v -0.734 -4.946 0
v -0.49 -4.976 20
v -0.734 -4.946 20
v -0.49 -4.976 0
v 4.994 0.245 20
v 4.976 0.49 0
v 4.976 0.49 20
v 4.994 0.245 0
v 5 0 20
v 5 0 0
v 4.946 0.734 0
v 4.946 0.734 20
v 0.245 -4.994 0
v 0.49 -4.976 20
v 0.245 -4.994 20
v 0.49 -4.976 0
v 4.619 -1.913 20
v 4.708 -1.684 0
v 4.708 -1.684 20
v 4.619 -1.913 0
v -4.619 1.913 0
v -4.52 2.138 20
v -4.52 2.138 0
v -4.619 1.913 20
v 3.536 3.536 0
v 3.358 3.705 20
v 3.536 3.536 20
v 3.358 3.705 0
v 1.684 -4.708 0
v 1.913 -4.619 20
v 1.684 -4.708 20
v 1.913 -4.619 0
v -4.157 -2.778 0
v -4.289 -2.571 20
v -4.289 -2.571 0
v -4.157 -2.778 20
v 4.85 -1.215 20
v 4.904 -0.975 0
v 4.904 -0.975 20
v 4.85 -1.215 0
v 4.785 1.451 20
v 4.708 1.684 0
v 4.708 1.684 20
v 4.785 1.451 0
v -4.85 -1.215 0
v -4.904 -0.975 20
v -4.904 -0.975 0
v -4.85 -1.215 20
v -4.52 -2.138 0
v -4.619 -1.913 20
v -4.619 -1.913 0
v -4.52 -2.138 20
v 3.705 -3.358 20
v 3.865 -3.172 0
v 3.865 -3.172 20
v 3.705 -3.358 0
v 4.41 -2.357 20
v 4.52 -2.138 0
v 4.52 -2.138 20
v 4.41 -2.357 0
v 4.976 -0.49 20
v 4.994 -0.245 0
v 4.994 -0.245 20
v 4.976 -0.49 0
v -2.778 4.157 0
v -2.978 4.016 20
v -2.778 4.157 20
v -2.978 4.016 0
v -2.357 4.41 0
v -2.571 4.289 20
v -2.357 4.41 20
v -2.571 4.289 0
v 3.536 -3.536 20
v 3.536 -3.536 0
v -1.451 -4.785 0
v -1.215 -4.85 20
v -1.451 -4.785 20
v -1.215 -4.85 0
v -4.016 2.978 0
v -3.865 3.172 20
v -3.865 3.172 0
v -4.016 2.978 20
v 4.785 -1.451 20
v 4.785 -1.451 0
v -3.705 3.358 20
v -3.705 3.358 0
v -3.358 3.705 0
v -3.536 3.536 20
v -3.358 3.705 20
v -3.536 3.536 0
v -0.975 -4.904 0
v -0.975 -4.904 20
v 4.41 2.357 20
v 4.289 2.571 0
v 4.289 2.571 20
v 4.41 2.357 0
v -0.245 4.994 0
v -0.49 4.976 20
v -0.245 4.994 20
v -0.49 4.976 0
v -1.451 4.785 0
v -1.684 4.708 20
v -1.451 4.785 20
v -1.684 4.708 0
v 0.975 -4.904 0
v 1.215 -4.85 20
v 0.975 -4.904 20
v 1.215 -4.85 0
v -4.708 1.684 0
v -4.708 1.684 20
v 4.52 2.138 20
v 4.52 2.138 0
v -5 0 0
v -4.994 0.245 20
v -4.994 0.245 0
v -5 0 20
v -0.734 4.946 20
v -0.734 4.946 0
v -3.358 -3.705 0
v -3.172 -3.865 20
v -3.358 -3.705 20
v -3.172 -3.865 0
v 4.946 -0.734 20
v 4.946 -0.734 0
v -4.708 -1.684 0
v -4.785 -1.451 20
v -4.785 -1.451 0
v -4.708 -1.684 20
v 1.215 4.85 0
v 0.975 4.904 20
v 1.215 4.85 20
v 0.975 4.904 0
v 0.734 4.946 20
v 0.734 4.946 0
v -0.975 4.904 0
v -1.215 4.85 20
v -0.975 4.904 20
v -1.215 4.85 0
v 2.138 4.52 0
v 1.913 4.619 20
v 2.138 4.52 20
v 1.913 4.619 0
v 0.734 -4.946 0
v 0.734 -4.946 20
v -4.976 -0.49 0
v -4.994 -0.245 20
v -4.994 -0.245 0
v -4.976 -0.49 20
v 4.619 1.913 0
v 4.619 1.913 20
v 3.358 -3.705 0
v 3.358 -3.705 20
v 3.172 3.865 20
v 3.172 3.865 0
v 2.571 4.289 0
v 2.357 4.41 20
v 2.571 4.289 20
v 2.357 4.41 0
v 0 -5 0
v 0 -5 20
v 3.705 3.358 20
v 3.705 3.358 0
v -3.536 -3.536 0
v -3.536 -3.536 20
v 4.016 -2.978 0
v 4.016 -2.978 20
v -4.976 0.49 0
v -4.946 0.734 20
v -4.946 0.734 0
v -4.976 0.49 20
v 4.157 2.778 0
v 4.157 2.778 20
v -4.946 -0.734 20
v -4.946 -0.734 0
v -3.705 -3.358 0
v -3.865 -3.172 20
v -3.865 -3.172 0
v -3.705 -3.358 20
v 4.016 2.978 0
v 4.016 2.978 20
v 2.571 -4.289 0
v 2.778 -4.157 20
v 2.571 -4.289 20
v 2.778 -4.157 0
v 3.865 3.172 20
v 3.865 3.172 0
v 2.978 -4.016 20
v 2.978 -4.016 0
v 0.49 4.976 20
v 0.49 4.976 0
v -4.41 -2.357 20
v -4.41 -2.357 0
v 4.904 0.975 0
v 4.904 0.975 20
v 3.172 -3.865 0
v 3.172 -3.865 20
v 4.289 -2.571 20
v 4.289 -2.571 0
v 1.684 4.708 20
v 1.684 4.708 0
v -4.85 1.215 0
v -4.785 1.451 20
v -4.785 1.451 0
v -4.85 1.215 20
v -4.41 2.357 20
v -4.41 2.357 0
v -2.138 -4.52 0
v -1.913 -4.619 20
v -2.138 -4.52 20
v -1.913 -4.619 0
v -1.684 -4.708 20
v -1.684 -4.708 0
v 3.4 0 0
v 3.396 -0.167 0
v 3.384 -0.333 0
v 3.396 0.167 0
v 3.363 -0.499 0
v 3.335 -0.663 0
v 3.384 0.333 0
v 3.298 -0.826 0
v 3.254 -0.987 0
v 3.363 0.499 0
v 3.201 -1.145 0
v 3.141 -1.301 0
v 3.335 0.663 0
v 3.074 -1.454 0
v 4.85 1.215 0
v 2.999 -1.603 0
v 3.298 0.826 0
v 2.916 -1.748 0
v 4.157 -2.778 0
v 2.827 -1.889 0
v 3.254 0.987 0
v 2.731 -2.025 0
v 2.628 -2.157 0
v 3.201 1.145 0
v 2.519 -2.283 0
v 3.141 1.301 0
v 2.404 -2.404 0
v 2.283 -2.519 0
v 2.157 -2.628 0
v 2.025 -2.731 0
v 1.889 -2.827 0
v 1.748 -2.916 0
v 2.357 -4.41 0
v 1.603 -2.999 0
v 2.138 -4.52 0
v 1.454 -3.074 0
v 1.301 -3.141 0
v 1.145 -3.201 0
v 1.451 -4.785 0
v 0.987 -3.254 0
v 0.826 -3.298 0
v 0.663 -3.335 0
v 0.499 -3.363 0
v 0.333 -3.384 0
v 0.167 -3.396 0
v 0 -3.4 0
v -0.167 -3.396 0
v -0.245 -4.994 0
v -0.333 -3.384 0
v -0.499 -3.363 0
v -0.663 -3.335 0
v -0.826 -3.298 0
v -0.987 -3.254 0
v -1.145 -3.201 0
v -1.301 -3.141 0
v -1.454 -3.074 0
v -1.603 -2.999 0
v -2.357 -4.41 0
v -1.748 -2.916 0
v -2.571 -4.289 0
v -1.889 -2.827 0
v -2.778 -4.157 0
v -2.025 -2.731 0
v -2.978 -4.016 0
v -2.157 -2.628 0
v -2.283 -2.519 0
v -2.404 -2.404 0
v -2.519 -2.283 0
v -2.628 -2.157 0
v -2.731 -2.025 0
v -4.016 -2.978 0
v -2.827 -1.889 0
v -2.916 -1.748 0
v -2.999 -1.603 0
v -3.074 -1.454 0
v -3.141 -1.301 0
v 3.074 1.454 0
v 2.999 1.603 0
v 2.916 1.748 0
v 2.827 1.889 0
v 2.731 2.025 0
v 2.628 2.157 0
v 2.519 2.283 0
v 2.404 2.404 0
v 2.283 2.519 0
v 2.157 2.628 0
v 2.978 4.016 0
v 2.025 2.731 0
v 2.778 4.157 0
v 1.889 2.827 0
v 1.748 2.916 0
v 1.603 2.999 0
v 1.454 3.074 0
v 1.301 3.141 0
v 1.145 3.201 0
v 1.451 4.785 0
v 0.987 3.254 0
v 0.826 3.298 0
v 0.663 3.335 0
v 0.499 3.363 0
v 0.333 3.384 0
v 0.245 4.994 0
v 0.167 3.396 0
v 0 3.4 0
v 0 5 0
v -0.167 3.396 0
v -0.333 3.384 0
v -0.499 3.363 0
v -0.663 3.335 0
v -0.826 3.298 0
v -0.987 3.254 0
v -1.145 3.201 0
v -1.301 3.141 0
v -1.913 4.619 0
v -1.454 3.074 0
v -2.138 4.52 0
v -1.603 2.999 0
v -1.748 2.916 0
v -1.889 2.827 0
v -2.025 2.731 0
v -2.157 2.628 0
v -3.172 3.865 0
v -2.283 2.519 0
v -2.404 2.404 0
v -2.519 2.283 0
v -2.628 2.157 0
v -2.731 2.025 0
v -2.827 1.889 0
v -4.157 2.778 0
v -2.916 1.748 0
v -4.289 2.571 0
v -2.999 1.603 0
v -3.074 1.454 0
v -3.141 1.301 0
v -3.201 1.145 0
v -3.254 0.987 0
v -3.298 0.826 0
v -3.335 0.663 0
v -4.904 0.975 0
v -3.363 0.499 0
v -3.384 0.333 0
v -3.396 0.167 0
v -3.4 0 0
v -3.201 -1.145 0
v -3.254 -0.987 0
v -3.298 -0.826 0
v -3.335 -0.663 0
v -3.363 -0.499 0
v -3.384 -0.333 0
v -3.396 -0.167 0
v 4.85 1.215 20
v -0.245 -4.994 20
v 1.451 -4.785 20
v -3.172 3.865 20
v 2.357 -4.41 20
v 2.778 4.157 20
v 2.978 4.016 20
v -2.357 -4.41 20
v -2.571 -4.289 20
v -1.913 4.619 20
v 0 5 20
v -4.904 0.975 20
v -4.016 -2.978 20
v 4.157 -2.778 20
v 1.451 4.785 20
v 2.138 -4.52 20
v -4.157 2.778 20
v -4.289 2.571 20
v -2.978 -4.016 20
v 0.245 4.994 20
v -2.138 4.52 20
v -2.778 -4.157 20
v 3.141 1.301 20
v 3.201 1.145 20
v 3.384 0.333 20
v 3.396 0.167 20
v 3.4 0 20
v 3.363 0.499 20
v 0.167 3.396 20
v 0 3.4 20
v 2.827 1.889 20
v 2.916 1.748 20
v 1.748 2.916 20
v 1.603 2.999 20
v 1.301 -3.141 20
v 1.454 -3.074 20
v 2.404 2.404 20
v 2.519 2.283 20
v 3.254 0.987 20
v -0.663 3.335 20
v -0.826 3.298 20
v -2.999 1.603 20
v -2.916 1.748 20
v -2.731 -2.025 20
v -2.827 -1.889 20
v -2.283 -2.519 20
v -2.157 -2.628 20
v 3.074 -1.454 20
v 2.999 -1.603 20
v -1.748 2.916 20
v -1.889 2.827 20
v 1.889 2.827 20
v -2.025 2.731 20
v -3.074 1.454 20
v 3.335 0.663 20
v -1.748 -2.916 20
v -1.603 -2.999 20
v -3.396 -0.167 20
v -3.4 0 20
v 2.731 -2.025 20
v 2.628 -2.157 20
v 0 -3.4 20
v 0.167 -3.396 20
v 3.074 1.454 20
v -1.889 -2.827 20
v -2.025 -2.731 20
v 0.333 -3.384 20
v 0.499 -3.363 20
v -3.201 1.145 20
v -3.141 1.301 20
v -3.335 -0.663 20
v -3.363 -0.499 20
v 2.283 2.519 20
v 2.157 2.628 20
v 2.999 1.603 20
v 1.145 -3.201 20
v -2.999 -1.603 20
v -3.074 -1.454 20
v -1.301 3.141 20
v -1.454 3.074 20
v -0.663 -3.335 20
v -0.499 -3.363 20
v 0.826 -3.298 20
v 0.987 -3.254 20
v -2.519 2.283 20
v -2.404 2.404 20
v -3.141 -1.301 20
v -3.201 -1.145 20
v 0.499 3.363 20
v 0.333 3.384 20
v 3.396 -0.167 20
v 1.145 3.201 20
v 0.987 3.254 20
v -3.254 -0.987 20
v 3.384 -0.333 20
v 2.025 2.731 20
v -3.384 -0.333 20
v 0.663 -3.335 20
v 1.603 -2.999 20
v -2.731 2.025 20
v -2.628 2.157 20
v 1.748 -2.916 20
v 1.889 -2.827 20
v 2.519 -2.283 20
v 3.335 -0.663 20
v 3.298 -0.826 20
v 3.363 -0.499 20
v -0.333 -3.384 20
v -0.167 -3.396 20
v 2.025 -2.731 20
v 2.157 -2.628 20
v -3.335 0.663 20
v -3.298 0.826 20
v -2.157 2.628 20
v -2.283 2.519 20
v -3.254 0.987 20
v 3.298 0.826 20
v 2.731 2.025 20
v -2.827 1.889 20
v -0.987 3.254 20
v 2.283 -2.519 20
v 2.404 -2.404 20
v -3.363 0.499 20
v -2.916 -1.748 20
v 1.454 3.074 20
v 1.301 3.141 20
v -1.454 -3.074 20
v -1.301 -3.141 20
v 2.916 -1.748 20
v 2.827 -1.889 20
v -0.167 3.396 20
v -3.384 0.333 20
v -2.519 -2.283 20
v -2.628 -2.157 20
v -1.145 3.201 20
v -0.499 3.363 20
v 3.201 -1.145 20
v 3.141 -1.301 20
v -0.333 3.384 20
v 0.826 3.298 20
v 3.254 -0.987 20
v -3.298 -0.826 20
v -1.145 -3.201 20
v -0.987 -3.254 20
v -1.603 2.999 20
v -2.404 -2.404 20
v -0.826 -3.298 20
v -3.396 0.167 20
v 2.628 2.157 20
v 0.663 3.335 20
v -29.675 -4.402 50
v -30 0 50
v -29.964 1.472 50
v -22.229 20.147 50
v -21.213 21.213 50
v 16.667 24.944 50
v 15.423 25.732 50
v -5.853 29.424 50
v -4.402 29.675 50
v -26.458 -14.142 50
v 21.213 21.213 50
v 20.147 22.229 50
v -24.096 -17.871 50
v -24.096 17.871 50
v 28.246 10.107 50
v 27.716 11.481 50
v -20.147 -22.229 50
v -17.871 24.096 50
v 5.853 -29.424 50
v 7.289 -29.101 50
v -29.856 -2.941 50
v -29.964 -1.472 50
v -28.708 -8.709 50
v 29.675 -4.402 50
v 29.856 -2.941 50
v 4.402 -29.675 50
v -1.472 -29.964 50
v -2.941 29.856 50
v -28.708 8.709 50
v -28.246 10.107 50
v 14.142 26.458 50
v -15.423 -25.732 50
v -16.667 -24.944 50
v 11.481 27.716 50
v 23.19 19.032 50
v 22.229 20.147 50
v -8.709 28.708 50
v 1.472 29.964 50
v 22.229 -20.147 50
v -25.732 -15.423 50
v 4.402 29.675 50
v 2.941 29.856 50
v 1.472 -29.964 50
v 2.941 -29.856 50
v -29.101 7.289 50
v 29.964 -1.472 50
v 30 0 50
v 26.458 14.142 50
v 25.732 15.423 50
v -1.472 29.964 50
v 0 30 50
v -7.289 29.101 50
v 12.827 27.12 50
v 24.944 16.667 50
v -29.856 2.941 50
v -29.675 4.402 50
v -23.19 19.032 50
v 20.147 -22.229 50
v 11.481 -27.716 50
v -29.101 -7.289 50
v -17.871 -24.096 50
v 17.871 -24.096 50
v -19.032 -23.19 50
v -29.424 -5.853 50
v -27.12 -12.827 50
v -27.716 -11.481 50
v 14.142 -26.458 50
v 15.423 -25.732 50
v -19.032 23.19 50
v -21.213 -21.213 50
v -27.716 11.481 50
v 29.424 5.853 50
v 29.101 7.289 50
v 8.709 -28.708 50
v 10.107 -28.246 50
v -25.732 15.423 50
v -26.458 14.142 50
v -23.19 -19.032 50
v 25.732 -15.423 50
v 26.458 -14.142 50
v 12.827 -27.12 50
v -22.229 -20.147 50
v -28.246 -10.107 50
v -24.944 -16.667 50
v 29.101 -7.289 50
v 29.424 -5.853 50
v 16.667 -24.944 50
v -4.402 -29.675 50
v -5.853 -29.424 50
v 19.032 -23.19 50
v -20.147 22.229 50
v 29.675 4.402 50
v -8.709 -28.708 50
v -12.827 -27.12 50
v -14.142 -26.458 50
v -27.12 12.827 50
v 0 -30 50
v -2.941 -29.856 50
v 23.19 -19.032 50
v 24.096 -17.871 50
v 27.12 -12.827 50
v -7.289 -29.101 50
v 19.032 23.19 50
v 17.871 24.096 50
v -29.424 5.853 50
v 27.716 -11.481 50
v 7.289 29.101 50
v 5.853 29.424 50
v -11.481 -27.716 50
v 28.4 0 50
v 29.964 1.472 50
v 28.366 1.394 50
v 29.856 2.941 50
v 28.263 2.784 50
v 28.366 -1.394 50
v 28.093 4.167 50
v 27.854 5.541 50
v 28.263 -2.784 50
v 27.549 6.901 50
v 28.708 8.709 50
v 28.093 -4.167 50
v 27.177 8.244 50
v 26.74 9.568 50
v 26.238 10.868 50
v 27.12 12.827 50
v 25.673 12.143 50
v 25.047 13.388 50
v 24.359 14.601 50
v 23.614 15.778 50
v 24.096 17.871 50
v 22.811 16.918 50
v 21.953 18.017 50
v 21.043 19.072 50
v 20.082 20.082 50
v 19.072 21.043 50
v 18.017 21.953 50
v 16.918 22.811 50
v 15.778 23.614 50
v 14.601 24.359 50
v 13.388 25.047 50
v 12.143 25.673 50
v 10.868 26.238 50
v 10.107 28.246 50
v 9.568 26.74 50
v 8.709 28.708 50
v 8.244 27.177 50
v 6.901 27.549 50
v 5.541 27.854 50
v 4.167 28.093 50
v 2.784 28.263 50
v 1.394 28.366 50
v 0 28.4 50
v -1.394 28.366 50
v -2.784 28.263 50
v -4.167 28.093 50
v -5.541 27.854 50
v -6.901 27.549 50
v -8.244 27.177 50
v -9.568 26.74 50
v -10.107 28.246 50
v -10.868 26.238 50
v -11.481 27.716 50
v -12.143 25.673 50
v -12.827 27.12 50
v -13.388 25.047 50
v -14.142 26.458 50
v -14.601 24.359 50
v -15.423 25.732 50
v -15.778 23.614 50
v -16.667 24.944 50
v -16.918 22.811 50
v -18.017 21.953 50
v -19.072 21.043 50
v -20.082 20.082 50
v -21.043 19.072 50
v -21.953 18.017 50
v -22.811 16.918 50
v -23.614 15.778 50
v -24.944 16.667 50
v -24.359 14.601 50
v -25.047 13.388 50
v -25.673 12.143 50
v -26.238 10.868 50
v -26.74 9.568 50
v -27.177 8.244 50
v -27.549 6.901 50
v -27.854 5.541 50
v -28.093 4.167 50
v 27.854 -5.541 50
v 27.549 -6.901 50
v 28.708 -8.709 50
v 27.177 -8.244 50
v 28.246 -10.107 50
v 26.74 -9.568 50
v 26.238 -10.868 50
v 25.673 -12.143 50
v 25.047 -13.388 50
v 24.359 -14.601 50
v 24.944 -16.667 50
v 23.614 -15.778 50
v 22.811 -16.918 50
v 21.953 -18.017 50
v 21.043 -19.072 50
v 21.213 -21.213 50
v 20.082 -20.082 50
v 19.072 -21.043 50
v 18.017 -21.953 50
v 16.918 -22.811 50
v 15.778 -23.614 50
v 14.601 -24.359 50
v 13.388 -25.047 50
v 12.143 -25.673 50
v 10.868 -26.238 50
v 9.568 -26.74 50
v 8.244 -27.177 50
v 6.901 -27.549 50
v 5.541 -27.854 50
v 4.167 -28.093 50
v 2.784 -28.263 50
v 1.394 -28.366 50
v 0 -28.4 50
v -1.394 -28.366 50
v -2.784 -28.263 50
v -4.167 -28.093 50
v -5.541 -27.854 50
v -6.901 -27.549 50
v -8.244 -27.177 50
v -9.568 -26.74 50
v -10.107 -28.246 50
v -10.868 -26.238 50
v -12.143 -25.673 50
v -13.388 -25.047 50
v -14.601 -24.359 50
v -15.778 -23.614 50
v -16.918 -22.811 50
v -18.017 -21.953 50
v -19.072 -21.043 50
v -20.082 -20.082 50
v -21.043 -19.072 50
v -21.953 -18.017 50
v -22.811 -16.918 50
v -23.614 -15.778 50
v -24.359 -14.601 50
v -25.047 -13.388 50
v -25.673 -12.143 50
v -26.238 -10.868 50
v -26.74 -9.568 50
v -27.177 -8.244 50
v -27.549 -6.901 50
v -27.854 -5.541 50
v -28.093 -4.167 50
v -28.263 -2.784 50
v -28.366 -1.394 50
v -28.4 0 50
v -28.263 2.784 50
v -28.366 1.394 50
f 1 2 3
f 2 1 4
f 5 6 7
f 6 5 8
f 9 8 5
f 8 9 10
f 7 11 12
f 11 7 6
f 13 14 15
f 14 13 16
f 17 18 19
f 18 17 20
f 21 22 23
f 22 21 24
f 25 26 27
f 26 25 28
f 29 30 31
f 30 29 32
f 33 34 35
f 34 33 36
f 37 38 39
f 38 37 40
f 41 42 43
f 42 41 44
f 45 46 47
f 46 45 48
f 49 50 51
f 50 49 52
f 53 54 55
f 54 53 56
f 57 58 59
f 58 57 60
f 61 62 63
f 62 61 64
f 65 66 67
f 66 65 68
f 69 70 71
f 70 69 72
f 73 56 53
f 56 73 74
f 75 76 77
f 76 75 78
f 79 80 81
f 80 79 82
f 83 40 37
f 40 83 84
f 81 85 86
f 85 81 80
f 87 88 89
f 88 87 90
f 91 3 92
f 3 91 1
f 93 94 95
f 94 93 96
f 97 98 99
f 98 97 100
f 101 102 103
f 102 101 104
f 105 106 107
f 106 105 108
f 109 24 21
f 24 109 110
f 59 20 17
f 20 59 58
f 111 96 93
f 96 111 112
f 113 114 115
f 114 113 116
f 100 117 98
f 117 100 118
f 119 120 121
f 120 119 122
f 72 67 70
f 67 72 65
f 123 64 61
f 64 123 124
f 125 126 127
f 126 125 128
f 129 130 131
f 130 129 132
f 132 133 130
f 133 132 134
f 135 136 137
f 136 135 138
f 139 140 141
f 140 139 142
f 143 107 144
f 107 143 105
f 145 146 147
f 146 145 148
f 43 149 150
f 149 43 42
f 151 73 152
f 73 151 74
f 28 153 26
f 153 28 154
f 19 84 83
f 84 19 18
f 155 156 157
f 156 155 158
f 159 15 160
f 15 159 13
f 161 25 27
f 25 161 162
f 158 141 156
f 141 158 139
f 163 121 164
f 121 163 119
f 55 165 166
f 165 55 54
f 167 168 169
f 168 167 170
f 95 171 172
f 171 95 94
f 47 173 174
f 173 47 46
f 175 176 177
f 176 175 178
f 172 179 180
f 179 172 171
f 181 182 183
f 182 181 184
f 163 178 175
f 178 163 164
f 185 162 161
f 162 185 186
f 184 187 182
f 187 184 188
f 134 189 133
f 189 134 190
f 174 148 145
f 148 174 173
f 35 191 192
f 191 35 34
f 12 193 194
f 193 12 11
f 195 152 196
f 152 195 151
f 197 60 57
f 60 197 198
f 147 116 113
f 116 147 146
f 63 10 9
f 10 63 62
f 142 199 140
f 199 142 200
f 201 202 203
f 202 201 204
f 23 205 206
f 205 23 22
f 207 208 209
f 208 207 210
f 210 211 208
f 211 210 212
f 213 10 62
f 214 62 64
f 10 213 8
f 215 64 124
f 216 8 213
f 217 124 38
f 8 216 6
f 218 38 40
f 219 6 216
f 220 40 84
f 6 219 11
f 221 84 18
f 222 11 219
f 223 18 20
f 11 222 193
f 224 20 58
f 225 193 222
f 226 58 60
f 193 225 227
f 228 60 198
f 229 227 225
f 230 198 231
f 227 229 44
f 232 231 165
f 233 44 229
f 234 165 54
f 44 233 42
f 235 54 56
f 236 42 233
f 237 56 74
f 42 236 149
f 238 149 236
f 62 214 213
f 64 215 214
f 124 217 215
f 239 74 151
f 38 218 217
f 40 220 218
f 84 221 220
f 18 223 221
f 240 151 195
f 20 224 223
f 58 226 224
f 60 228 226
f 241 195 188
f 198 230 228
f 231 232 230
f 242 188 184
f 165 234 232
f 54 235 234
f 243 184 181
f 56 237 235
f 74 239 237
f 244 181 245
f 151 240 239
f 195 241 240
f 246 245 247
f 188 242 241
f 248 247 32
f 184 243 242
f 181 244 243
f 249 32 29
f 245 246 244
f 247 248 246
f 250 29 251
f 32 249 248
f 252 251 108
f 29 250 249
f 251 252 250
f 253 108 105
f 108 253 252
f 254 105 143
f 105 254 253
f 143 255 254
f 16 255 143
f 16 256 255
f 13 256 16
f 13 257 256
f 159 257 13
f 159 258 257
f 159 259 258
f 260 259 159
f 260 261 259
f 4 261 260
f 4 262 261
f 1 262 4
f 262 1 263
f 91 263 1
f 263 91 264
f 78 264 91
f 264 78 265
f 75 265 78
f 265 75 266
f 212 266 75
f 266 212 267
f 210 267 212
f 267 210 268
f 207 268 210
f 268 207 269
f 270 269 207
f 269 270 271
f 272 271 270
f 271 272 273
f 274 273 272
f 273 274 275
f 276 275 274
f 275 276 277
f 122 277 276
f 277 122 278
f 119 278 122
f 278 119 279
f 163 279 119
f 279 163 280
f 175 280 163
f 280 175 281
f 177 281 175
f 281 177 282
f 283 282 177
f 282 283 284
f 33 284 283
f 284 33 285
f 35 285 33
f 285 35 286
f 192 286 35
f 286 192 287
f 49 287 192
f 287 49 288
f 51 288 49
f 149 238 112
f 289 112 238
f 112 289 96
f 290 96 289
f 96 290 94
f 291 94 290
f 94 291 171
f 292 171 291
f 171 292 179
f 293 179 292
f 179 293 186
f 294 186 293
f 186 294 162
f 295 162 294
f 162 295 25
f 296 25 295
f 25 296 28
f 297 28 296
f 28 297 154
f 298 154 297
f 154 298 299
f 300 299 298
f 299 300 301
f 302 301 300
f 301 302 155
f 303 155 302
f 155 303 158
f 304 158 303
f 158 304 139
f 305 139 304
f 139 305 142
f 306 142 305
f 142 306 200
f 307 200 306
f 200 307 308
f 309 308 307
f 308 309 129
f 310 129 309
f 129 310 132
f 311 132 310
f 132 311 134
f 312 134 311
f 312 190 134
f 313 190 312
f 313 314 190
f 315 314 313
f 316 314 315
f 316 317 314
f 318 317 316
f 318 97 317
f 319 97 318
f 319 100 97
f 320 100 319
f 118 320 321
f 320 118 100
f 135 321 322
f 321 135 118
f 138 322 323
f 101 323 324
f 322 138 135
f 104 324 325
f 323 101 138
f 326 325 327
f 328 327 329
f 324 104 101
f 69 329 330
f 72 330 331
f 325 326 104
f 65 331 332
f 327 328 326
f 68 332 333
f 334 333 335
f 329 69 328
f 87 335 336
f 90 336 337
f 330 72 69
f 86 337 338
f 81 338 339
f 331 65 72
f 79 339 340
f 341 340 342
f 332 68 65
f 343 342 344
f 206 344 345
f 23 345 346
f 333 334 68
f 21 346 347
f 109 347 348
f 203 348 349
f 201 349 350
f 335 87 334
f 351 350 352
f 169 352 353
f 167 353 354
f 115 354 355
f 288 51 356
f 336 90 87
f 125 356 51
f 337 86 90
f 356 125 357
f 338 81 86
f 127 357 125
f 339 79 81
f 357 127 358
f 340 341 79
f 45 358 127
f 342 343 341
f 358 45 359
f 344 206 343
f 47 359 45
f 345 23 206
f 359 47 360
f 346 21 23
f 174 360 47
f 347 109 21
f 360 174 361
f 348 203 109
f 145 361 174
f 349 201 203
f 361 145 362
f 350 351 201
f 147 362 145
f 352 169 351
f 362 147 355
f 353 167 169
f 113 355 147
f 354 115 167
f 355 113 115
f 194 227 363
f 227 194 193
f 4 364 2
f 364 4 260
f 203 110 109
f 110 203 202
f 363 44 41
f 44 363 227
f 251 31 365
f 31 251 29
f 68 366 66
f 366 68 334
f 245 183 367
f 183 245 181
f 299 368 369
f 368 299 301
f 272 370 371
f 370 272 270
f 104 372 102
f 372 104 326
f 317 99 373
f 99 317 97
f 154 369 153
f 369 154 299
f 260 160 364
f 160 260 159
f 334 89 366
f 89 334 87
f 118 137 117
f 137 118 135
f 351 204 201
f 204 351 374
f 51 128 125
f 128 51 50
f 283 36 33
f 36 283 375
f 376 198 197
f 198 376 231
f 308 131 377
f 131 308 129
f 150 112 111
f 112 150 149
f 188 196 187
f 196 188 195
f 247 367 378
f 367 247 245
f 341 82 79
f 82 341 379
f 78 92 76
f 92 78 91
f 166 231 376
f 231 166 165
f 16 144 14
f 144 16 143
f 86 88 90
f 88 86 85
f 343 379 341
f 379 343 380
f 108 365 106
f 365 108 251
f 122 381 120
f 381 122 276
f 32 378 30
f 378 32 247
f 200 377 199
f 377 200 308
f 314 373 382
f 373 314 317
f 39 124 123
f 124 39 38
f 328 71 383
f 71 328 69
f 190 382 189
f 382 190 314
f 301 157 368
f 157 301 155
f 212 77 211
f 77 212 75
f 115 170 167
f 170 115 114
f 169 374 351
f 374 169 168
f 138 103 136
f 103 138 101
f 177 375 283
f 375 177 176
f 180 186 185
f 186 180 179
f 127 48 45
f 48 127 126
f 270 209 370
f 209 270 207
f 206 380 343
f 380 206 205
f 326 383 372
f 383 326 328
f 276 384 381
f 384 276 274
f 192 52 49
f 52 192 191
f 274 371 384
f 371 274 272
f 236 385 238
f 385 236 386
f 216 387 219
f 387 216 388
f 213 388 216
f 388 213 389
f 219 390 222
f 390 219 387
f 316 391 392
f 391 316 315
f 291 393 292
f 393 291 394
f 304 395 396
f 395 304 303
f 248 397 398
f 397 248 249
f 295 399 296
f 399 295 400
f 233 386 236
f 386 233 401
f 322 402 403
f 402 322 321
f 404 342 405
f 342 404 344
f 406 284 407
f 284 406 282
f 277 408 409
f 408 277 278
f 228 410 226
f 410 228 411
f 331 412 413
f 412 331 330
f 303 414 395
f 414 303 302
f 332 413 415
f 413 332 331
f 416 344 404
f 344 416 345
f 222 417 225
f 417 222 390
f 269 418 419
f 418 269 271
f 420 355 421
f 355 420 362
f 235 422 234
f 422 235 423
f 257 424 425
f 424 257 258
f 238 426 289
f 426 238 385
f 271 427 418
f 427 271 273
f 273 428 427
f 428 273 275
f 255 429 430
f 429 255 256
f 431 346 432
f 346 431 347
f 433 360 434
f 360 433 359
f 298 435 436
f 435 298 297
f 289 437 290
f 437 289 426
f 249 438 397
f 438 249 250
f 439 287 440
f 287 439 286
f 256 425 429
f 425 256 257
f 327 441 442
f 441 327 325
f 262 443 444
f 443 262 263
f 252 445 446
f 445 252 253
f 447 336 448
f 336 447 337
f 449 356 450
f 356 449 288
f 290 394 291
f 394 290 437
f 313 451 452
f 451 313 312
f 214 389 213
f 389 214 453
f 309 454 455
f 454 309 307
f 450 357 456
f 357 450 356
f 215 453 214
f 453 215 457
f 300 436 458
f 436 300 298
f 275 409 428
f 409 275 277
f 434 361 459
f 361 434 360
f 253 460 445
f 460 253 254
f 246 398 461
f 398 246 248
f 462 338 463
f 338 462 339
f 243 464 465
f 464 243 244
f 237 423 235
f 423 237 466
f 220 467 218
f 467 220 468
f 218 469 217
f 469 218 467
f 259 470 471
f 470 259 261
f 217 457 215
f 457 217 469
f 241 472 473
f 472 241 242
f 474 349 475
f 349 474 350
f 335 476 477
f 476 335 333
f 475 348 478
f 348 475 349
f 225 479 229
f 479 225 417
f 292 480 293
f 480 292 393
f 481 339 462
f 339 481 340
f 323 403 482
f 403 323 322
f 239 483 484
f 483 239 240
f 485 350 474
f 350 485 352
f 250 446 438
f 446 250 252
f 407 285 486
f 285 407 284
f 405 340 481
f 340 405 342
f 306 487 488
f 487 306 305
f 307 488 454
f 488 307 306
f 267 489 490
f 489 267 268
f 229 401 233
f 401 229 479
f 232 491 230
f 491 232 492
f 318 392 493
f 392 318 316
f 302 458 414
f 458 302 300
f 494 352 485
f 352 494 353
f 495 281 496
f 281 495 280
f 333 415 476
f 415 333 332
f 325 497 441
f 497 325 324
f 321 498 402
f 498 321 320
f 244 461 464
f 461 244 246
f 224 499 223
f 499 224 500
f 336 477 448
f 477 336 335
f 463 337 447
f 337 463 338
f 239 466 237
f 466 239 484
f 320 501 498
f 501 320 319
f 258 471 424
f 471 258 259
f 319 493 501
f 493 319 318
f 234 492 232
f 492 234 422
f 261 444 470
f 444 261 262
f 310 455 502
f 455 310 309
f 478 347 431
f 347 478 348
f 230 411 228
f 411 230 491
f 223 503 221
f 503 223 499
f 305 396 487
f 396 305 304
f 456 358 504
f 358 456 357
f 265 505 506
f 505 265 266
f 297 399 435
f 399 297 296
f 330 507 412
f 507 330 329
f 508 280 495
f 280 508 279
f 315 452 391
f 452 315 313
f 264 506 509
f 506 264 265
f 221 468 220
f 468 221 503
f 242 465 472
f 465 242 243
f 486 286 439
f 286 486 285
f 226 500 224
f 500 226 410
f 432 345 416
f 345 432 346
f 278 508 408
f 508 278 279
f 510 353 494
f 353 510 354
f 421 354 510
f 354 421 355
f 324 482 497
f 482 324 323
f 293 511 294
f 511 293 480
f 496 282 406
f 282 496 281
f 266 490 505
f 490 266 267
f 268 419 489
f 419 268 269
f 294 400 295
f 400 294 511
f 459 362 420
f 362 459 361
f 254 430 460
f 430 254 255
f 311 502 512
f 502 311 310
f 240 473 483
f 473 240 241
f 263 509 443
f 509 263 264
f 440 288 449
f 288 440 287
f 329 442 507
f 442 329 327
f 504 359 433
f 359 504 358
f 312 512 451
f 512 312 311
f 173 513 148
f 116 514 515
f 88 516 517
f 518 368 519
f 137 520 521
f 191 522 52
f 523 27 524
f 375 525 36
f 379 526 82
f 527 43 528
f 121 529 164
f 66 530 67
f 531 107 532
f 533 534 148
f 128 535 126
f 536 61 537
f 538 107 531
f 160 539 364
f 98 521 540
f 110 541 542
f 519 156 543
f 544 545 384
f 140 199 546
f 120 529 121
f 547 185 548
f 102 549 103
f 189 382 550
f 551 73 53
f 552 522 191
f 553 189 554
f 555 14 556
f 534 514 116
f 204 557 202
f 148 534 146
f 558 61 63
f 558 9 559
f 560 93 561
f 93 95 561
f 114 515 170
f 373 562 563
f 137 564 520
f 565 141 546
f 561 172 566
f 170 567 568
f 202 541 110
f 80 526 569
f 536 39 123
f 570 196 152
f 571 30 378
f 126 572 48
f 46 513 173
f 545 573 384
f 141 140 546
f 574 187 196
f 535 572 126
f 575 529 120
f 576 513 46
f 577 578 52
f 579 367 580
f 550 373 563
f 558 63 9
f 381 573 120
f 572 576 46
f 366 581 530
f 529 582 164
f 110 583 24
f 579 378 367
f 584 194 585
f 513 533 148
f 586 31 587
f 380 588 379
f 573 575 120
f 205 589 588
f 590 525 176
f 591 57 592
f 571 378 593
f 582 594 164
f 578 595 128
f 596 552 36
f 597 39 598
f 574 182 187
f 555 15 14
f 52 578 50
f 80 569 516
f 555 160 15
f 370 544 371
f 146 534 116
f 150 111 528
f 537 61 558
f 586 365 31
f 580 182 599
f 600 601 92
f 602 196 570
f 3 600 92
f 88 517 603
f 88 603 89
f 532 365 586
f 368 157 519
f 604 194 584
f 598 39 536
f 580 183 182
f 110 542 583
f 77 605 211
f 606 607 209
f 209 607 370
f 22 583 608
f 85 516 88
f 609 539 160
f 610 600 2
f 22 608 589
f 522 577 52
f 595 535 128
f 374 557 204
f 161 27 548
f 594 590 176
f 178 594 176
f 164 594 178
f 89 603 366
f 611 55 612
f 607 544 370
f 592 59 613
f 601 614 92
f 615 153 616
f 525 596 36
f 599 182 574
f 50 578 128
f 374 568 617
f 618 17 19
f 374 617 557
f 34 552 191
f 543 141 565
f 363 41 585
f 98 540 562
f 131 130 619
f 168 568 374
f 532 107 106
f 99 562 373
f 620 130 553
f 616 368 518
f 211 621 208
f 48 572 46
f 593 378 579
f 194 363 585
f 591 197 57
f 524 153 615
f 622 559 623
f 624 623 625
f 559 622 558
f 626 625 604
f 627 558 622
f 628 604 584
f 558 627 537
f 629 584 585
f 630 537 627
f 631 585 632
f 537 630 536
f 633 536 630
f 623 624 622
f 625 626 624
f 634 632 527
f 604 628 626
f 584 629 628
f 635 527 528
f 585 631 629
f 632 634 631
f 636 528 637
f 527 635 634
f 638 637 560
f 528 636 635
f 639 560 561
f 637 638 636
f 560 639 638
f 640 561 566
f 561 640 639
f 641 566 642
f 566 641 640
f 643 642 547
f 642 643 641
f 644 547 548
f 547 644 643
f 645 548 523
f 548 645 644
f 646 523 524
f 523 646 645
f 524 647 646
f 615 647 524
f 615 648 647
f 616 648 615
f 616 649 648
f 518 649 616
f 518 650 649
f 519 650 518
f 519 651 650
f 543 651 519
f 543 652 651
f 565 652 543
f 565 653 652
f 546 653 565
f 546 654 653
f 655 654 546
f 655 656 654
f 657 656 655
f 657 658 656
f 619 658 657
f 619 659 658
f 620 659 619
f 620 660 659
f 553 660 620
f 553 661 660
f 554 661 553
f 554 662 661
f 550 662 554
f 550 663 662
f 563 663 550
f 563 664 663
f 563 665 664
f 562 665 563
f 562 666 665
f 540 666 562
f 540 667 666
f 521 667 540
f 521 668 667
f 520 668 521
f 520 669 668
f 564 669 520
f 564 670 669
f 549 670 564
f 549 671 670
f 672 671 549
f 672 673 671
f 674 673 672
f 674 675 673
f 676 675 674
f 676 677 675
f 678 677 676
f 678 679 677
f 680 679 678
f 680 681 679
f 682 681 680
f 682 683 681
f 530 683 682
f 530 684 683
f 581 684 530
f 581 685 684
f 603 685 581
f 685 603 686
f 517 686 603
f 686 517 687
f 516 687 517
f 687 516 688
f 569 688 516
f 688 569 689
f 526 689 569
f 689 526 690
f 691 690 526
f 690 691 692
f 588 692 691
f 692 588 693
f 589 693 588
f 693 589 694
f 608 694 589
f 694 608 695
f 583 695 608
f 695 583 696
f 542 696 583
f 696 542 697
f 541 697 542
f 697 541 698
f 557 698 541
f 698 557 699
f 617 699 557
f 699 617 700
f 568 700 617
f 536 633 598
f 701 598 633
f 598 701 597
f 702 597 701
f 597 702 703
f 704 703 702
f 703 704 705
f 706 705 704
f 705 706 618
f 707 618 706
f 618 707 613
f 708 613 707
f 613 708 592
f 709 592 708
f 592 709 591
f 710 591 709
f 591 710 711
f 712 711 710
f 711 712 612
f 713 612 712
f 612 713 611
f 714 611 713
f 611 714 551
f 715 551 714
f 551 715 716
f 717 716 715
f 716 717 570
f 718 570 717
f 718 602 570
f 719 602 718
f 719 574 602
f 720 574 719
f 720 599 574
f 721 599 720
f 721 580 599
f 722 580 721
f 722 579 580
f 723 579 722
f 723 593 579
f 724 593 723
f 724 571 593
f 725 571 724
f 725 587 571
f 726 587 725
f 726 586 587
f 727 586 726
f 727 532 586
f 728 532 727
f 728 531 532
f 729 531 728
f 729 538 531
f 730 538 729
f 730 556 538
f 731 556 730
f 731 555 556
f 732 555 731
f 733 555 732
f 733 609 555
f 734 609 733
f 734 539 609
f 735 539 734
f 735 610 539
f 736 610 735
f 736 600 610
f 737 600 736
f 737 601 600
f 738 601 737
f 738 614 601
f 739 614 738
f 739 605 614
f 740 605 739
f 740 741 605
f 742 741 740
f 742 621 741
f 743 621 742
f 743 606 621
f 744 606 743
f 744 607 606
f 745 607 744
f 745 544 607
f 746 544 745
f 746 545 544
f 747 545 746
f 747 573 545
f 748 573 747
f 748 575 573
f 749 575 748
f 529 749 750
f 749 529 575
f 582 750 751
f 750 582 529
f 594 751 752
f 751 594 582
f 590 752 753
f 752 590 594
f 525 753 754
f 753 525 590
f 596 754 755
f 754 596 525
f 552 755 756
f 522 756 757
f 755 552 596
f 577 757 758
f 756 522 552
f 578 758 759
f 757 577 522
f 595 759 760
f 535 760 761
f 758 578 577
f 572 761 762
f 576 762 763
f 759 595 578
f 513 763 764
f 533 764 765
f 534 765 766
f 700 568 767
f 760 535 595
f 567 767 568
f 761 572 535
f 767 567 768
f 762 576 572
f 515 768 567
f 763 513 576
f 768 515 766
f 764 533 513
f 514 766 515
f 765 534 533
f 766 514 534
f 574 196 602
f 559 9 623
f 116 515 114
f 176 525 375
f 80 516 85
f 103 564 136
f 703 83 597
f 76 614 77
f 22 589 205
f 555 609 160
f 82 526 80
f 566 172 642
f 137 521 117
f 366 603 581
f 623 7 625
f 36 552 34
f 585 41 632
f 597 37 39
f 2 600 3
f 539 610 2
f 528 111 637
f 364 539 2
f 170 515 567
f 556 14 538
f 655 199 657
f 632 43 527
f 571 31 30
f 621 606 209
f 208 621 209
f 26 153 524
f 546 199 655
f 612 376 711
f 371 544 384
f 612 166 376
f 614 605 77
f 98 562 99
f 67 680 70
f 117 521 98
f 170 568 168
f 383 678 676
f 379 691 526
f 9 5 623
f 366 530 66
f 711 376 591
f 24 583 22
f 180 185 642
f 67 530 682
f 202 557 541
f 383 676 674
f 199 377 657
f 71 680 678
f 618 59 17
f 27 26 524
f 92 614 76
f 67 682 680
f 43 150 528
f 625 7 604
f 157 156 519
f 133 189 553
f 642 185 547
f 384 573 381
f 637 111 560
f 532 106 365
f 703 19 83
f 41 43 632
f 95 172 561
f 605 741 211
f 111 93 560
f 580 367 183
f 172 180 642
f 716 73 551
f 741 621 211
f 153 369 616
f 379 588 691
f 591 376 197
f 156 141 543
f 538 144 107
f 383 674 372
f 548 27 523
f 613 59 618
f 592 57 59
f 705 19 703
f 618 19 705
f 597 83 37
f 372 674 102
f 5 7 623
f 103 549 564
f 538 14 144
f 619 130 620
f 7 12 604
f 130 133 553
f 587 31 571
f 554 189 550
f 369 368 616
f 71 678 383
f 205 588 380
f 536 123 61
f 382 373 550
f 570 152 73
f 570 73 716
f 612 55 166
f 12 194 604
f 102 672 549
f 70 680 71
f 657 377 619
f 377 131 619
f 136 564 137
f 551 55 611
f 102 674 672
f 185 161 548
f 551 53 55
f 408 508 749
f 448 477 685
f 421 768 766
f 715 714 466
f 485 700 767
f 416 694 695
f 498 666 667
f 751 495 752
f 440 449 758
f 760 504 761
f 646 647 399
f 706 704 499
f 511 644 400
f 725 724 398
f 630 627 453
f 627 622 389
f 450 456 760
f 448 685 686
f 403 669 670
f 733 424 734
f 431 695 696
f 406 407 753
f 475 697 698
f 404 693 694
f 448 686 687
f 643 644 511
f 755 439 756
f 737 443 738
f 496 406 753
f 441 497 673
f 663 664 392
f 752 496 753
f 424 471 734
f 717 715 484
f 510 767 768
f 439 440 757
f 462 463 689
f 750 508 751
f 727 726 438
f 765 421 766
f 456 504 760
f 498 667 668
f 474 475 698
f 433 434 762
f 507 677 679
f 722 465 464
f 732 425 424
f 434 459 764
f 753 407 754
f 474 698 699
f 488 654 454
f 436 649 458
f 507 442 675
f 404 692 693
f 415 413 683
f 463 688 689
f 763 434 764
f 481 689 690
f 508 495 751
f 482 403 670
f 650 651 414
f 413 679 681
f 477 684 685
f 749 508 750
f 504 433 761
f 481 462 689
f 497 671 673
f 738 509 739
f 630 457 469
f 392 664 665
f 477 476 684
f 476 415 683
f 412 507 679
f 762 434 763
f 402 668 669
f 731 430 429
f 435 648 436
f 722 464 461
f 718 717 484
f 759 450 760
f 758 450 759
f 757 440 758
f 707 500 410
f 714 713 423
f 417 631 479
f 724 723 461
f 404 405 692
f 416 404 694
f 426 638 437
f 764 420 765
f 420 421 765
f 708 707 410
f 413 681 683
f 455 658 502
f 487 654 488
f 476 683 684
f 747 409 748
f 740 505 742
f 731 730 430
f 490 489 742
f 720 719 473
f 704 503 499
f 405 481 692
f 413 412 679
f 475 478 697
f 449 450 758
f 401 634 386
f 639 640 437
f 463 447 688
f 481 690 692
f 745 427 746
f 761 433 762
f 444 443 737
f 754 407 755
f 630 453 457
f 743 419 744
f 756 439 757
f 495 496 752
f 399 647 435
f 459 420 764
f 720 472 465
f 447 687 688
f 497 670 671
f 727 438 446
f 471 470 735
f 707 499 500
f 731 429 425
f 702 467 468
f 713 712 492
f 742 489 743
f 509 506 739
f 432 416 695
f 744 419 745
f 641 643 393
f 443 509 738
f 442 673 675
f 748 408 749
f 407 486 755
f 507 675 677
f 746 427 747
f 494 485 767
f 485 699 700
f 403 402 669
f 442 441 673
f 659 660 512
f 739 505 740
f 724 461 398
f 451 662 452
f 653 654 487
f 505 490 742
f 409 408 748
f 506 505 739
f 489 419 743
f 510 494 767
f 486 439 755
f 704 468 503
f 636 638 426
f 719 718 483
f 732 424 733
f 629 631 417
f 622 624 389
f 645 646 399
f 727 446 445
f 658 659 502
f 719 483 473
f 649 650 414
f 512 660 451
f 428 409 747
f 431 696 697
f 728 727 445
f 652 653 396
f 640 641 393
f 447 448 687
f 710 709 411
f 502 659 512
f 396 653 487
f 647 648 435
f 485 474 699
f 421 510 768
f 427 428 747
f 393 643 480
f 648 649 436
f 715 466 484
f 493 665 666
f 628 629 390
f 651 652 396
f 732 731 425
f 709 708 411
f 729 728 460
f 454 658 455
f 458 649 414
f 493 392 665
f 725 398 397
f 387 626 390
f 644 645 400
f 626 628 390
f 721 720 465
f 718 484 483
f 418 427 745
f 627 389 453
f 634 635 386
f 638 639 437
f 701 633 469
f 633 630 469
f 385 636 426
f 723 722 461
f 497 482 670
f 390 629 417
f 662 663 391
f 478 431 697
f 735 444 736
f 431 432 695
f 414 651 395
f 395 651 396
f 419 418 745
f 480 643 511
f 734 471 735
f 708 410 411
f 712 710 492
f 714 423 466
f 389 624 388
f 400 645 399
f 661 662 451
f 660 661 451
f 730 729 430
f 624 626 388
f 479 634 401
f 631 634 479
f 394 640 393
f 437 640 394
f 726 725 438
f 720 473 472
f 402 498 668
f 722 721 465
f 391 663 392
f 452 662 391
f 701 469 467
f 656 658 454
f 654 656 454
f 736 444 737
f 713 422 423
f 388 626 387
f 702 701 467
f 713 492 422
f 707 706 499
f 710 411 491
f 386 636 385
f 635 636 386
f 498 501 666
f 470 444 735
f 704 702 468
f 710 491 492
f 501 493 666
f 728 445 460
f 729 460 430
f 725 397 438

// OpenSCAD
// Lab Funnel Design - Corrected
// Units: millimetres
// Orientation: Upright, wide opening at top, rests on XY plane at z=0.

$fn = 128; // High resolution for smooth curves

// Dimensions
spout_outer_diameter = 10;
spout_inner_diameter = 6.8; // 10 - 2*1.6
spout_length = 20;
spout_wall_thickness = 1.6;

cone_bottom_outer_diameter = 10;
cone_top_outer_diameter = 60;
cone_height = 30; // From z=20 to z=50
wall_thickness = 1.6;

// Calculate inner diameters for the cone
cone_bottom_inner_diameter = cone_bottom_outer_diameter - 2 * wall_thickness;
cone_top_inner_diameter = cone_top_outer_diameter - 2 * wall_thickness;

// Main Assembly
// The funnel rests on the XY plane at z=0.
// The spout runs from z=0 to z=20.
// The cone runs from z=20 to z=50.

translate([0, 0, 0]) {
    // 1. Spout (Tube)
    // Centered at z = spout_length / 2 to sit on z=0
    difference() {
        cylinder(h = spout_length, d = spout_outer_diameter, $fn = $fn);
        cylinder(h = spout_length, d = spout_inner_diameter, $fn = $fn);
    }

    // 2. Cone
    // Starts at z = spout_length, ends at z = spout_length + cone_height
    translate([0, 0, spout_length]) {
        difference() {
            // Outer Cone
            rotate_extrude(convexity = 3) {
                // Profile: line from (0, 0) to (radius, height)
                // We define the profile relative to the base of the cone (z=0 in local coords)
                // Base radius = cone_bottom_outer_diameter / 2
                // Top radius = cone_top_outer_diameter / 2
                // Since rotate_extrude extrudes along Z, we define the line in XZ plane
                // Point 1: (0, 0) -> Center of base
                // Point 2: (cone_bottom_outer_diameter/2, 0) -> Edge of base
                // Point 3: (cone_top_outer_diameter/2, cone_height) -> Edge of top
                // Point 4: (0, cone_height) -> Center of top
                polygon(points = [
                    [0, 0],
                    [cone_bottom_outer_diameter / 2, 0],
                    [cone_top_outer_diameter / 2, cone_height],
                    [0, cone_height]
                ]);
            }
            
            // Inner Cone (Hole)
            rotate_extrude(convexity = 3) {
                // Inner profile
                inner_base_radius = cone_bottom_inner_diameter / 2;
                inner_top_radius = cone_top_inner_diameter / 2;
                polygon(points = [
                    [0, 0],
                    [inner_base_radius, 0],
                    [inner_top_radius, cone_height],
                    [0, cone_height]
                ]);
            }
        }
    }
}
